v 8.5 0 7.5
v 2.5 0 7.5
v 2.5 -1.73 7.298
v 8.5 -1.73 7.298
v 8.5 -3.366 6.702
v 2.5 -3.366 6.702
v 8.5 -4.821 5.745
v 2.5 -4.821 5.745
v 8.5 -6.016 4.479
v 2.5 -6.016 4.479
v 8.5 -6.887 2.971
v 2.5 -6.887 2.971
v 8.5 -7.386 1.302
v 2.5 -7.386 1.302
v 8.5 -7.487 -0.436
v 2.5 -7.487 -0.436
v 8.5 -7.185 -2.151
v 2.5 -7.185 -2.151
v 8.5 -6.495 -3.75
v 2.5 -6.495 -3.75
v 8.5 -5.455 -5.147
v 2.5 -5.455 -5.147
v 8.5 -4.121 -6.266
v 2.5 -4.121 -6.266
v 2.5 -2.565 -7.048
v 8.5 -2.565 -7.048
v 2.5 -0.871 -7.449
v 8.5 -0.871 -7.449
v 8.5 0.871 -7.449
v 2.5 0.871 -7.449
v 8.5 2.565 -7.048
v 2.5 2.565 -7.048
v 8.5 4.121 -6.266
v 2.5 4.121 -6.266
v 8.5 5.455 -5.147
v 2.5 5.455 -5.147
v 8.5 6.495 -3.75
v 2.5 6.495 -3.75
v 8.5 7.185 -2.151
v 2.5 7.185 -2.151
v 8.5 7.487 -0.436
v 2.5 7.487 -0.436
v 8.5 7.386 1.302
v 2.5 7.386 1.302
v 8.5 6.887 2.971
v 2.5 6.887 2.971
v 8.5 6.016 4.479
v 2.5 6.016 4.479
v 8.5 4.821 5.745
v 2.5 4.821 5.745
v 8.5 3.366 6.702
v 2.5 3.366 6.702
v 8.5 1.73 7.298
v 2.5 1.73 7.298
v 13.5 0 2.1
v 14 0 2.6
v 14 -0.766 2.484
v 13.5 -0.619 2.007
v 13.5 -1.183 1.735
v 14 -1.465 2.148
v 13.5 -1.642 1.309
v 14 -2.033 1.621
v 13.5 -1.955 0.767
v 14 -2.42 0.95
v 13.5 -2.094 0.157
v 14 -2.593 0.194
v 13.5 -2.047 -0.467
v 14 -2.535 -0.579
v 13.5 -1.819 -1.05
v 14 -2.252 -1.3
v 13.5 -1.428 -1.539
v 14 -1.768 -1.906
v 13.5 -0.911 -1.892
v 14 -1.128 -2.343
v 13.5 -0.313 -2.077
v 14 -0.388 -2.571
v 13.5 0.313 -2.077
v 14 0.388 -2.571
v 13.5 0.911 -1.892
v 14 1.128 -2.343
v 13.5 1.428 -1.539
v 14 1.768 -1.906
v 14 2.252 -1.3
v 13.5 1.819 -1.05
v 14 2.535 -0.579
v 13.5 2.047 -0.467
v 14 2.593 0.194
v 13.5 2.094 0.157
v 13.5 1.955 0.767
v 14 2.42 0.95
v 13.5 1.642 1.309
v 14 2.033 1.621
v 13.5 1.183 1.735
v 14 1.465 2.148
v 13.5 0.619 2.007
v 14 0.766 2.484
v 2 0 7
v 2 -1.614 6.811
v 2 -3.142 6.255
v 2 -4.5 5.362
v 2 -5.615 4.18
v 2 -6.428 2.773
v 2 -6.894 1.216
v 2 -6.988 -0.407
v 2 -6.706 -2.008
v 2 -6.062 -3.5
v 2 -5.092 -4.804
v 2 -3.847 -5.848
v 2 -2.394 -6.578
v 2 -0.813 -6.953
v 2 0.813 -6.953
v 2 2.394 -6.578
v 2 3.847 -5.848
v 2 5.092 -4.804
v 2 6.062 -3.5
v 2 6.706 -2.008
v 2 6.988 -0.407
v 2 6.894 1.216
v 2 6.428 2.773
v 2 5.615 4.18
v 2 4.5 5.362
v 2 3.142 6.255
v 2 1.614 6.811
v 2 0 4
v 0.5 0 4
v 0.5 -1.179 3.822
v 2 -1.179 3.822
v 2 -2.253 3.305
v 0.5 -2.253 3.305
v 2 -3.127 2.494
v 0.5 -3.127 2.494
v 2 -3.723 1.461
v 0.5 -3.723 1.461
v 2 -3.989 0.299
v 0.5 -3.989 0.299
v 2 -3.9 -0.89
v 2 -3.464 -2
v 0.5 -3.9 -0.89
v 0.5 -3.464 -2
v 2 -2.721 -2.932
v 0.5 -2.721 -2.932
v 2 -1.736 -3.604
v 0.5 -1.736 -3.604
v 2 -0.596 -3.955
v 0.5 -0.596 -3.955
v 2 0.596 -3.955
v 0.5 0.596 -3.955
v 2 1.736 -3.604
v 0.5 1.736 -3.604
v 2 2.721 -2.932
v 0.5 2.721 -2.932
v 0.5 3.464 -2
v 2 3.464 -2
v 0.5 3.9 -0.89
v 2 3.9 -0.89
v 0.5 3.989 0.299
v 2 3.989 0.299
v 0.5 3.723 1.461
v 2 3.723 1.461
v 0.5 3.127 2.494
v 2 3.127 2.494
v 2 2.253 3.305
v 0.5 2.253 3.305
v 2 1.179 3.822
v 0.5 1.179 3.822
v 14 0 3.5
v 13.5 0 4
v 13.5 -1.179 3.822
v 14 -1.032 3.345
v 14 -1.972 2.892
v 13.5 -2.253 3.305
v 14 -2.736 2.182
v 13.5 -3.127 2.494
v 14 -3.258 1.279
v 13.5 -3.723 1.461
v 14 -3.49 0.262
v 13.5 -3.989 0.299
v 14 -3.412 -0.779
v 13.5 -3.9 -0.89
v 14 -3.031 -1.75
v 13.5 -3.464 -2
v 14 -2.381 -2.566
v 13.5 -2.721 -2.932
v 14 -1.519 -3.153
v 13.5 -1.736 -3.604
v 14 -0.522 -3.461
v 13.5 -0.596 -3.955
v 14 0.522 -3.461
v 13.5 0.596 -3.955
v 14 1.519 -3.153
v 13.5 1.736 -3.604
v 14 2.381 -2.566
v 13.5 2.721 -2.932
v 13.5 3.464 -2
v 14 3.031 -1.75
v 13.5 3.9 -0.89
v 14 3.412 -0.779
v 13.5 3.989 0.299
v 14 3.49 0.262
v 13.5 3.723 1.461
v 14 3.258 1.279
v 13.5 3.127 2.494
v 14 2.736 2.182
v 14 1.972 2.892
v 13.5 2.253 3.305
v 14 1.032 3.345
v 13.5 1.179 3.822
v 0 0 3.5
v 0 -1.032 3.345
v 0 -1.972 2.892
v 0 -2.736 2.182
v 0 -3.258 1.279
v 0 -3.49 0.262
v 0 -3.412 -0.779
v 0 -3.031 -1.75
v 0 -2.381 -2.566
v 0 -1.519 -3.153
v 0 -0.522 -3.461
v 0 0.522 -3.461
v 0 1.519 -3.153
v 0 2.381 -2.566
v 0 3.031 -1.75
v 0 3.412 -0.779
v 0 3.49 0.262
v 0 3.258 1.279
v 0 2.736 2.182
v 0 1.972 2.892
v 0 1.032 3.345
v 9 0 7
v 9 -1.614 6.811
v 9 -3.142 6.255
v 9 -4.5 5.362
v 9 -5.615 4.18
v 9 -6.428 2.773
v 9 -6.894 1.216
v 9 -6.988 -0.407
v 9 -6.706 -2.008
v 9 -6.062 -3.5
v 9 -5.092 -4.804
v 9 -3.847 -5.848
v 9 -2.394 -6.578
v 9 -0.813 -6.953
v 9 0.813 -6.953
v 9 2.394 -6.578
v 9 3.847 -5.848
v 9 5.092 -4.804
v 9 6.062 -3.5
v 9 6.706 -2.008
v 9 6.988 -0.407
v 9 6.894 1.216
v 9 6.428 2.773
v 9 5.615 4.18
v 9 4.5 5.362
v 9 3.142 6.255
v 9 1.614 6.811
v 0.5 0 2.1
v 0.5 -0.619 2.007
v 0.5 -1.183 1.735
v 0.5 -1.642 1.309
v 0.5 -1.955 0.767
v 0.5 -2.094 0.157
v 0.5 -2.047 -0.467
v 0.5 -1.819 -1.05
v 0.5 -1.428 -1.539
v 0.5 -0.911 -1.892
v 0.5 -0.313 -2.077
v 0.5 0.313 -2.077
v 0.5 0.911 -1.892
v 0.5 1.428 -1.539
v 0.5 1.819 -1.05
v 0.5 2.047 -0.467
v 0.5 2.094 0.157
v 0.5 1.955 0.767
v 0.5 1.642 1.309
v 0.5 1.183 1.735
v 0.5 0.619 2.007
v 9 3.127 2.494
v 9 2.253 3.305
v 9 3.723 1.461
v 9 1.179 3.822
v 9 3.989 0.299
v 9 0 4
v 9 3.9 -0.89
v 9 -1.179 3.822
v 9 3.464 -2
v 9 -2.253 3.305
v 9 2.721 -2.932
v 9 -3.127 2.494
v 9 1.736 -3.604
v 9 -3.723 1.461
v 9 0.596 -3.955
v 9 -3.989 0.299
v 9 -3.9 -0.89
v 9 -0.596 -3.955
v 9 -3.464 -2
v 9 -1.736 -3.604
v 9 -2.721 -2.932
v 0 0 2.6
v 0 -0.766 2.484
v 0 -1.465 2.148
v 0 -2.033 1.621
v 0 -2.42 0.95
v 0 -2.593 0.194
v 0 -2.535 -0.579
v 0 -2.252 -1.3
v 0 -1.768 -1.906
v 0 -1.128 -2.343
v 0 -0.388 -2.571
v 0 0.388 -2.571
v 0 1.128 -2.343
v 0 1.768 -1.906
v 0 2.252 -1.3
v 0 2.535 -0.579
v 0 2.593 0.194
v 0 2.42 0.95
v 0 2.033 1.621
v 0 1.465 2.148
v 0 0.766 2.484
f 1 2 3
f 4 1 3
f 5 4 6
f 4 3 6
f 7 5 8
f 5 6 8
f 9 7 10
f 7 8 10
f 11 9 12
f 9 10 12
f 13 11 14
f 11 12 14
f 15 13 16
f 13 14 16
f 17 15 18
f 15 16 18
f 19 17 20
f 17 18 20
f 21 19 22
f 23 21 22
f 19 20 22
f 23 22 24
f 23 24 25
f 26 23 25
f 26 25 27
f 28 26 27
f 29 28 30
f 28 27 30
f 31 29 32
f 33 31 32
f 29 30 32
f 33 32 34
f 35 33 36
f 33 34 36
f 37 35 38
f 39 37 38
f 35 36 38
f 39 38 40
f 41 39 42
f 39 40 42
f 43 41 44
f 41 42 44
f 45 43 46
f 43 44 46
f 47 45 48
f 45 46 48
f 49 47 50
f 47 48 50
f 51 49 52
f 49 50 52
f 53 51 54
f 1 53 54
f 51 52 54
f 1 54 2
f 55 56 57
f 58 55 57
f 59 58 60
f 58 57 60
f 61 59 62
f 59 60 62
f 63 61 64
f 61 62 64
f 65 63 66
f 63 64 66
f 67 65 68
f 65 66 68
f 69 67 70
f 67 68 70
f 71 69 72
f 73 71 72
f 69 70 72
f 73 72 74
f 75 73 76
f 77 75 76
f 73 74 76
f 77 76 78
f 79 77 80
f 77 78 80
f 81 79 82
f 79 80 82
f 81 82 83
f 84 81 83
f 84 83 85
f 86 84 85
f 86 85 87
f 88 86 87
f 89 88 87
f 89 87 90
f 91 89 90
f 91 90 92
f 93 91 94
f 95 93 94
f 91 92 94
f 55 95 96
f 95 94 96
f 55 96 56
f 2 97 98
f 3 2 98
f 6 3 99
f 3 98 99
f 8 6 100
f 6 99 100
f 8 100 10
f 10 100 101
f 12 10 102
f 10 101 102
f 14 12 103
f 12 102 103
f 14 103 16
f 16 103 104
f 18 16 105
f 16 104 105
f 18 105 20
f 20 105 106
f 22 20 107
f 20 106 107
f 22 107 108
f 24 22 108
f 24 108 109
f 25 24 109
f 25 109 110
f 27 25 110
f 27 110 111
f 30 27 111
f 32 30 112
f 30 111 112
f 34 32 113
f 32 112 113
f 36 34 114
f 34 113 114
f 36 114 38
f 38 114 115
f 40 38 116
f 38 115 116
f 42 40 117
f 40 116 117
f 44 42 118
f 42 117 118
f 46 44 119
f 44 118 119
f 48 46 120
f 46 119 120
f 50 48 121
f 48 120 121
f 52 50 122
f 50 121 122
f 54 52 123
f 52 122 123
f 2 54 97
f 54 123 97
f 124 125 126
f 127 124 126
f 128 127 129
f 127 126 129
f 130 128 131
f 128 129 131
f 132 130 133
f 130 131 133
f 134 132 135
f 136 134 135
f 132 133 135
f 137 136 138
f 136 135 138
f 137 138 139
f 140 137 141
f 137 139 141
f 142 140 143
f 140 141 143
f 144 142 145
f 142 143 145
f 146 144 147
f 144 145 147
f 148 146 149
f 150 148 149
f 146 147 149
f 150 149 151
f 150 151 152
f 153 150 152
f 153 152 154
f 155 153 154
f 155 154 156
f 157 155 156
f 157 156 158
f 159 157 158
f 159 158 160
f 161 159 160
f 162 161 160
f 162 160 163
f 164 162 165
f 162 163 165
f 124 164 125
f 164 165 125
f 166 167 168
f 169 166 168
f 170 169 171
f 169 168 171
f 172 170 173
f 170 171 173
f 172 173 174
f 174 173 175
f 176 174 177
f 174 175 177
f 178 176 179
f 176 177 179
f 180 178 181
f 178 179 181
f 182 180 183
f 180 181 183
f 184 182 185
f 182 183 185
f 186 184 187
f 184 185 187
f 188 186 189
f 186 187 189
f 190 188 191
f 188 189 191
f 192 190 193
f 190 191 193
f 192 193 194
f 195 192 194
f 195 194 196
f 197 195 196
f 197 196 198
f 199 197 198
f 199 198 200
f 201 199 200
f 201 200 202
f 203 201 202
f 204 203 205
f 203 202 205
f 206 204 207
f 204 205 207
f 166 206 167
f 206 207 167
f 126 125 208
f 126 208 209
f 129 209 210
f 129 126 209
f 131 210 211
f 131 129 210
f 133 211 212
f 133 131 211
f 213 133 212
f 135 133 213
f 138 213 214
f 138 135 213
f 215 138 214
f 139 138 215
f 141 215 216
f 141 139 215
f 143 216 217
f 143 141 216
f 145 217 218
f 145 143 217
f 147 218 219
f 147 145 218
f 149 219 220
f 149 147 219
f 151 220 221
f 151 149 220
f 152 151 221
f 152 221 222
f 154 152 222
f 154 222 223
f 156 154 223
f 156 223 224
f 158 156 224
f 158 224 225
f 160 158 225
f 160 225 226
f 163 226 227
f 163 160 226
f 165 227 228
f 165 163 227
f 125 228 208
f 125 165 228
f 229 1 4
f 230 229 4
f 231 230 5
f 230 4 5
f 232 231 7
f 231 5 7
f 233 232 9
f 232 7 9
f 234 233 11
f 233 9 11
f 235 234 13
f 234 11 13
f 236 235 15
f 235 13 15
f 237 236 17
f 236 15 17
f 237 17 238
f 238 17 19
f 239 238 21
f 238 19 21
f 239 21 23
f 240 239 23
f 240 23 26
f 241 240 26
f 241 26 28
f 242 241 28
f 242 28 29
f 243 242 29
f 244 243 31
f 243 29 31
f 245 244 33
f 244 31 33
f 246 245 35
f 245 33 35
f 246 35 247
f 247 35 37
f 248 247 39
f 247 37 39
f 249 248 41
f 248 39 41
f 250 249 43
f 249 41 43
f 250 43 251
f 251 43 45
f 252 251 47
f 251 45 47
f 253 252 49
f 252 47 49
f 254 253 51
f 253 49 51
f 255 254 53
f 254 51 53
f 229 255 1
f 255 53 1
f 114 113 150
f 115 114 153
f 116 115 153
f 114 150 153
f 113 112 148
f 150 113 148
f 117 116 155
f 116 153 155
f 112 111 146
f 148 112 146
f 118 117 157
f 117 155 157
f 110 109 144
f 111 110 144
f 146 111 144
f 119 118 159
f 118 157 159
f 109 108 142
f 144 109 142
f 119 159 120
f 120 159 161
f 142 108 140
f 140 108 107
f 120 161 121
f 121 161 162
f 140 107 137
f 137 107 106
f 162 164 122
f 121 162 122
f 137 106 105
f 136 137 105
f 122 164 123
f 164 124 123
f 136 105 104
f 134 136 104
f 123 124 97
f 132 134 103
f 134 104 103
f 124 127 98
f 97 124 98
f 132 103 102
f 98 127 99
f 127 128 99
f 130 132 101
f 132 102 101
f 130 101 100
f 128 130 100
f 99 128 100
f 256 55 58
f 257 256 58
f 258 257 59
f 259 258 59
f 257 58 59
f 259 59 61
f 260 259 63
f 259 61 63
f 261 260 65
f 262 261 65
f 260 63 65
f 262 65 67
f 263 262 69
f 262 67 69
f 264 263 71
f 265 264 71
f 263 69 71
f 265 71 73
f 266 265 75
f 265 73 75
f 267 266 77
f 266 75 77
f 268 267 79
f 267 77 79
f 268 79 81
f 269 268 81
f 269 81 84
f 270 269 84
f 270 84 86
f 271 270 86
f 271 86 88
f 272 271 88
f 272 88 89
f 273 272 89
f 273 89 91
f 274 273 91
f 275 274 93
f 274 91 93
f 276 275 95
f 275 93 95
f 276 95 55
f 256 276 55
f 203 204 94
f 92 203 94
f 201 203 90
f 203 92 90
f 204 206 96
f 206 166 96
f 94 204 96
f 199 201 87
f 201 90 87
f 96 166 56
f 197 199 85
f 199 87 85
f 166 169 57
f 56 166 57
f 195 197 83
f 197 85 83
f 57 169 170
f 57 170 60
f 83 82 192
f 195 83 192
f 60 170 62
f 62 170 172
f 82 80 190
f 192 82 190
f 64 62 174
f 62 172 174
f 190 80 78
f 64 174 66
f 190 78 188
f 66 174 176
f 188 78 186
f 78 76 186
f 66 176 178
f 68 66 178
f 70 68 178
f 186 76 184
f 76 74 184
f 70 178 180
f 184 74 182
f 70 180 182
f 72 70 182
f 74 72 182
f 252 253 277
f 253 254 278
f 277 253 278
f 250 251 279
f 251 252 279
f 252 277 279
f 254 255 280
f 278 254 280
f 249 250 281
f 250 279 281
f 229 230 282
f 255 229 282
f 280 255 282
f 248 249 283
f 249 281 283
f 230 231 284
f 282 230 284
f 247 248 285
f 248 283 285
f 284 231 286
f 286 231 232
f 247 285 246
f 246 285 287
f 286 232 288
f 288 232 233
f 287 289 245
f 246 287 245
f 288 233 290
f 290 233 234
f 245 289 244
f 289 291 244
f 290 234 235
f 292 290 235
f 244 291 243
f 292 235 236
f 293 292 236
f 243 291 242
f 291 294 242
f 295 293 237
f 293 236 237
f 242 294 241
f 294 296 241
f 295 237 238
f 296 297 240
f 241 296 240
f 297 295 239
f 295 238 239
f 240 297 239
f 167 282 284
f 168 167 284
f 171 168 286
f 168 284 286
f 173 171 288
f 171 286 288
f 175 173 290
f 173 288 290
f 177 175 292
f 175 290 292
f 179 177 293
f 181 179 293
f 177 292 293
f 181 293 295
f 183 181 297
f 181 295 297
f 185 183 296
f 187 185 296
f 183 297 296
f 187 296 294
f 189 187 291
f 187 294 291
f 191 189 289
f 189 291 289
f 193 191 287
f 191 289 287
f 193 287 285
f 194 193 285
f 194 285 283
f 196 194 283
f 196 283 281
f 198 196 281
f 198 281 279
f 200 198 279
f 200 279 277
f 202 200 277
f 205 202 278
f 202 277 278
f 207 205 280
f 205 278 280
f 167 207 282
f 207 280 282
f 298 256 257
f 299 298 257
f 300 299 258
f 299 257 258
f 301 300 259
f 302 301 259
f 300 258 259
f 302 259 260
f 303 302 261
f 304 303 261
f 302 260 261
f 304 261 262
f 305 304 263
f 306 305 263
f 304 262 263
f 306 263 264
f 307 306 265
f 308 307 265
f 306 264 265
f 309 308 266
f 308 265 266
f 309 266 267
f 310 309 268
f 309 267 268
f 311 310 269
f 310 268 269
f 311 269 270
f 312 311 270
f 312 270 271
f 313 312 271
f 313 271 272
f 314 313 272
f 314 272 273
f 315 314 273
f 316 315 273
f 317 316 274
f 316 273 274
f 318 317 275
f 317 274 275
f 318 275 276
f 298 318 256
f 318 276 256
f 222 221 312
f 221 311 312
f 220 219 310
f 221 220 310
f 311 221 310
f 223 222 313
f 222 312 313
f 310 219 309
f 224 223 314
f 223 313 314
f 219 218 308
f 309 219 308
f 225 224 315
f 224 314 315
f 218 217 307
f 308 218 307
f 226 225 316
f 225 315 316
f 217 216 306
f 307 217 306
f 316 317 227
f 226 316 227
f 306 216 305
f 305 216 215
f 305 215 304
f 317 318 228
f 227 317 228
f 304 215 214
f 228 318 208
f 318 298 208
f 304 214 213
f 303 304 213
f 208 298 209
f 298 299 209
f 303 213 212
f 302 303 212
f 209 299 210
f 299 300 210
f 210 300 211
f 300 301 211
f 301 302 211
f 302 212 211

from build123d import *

# Parameters (mm, degrees)
F2_SIZE = 0.5


with BuildPart() as f1:
    # F0 (on Front) → F1 (revolve)
    with BuildSketch(Plane.XZ):
        Polygon((0, 4), (0, 2.1), (14, 2.1), (14, 4), (9, 4), (9, 7.5), (2, 7.5), (2, 4), align=None)
    revolve(axis=Axis((9.418666, 0, 0), (1, 0, 0)))

    # F2
    f2_edges = [f1.edges().sort_by_distance(p)[0] for p in [
        (9, 0, -7.5),
        (2, 0, -7.5),
        (5.5, 0, 7.5),
        (0, 0, -2.1),
        (14, 0, -2.1),
        (7, 0, 2.1),
        (14, 0, -4),
        (0, 0, -4),
    ]]
    chamfer(f2_edges, length=F2_SIZE)


solid = f1.part
